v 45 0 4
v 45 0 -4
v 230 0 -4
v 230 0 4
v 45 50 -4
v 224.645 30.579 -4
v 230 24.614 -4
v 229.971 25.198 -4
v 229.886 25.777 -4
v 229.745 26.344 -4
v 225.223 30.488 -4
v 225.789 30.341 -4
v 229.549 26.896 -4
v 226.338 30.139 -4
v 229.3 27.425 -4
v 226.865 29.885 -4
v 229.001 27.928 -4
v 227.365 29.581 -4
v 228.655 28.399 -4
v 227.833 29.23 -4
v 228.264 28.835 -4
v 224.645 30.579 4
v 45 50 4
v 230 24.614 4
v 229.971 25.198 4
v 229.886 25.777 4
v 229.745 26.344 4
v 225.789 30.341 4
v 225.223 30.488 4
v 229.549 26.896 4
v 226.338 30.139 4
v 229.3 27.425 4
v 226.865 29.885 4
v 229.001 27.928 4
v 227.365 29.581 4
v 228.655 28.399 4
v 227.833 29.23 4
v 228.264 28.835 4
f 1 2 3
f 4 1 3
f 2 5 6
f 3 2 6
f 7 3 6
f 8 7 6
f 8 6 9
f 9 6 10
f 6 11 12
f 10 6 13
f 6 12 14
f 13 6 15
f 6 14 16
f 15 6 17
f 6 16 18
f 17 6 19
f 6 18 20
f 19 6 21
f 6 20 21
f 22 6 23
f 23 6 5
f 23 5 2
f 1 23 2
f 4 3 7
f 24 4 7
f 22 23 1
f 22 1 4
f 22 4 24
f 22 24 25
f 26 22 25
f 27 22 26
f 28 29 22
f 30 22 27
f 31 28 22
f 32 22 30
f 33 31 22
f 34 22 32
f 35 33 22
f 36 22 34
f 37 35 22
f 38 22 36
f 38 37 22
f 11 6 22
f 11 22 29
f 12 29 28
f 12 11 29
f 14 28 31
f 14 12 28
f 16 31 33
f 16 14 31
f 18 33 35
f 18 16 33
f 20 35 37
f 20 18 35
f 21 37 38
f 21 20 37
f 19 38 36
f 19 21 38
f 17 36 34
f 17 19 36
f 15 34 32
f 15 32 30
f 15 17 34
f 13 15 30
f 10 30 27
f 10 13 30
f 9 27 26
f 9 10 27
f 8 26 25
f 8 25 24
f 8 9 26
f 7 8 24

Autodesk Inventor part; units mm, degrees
ref_plane "YZ Plane" through (0, 0, 0) normal (1, 0, 0) x (0, 1, 0)
ref_plane "XZ Plane" through (0, 0, 0) normal (0, 1, 0) x (-1, 0, 0)
ref_plane "XY Plane" through (0, 0, 0) normal (0, 0, 1) x (1, 0, 0)
sketch "Sketch3" plane through (0, 0, 0) normal (0, 0, 1) x (1, 0, 0)
  line L0 (0, 0) -> (230, 0)
  line L1 (230, 0) -> (230, 30)
  line L2 (230, 30) -> (-74.7049, 62.9411)
  line L3 (45, 50) -> (45, 0)
  dimension "d11" = 230
  dimension "d12" = 30
  dimension "d13" = 45
  dimension "d14" = 50
extrude "Plate1" add sketch "Sketch3" along normal mid plane 8
fillet "Corner Round1" radius 6 1 edges at (230, 30, 0)
equation "\"d15\" = Thickness"
equation "\"BendRadius\" = Thickness"
equation "\"BendReliefWidth\" = Thickness"
equation "\"BendReliefDepth\" = 0.5 * Thickness"
equation "\"CornerReliefSize\" = 4 * Thickness"
equation "\"MinimumRemnant\" = 2 * Thickness"
equation "\"TransitionRadius\" = BendRadius"
equation "\"JacobiRadiusSize\" = BendRadius"
equation "\"GapSize\" = Thickness"
equation "\"Thickness\" = 8"
properties part number "APN 1413 charging hatch reinf" material "Steel"
